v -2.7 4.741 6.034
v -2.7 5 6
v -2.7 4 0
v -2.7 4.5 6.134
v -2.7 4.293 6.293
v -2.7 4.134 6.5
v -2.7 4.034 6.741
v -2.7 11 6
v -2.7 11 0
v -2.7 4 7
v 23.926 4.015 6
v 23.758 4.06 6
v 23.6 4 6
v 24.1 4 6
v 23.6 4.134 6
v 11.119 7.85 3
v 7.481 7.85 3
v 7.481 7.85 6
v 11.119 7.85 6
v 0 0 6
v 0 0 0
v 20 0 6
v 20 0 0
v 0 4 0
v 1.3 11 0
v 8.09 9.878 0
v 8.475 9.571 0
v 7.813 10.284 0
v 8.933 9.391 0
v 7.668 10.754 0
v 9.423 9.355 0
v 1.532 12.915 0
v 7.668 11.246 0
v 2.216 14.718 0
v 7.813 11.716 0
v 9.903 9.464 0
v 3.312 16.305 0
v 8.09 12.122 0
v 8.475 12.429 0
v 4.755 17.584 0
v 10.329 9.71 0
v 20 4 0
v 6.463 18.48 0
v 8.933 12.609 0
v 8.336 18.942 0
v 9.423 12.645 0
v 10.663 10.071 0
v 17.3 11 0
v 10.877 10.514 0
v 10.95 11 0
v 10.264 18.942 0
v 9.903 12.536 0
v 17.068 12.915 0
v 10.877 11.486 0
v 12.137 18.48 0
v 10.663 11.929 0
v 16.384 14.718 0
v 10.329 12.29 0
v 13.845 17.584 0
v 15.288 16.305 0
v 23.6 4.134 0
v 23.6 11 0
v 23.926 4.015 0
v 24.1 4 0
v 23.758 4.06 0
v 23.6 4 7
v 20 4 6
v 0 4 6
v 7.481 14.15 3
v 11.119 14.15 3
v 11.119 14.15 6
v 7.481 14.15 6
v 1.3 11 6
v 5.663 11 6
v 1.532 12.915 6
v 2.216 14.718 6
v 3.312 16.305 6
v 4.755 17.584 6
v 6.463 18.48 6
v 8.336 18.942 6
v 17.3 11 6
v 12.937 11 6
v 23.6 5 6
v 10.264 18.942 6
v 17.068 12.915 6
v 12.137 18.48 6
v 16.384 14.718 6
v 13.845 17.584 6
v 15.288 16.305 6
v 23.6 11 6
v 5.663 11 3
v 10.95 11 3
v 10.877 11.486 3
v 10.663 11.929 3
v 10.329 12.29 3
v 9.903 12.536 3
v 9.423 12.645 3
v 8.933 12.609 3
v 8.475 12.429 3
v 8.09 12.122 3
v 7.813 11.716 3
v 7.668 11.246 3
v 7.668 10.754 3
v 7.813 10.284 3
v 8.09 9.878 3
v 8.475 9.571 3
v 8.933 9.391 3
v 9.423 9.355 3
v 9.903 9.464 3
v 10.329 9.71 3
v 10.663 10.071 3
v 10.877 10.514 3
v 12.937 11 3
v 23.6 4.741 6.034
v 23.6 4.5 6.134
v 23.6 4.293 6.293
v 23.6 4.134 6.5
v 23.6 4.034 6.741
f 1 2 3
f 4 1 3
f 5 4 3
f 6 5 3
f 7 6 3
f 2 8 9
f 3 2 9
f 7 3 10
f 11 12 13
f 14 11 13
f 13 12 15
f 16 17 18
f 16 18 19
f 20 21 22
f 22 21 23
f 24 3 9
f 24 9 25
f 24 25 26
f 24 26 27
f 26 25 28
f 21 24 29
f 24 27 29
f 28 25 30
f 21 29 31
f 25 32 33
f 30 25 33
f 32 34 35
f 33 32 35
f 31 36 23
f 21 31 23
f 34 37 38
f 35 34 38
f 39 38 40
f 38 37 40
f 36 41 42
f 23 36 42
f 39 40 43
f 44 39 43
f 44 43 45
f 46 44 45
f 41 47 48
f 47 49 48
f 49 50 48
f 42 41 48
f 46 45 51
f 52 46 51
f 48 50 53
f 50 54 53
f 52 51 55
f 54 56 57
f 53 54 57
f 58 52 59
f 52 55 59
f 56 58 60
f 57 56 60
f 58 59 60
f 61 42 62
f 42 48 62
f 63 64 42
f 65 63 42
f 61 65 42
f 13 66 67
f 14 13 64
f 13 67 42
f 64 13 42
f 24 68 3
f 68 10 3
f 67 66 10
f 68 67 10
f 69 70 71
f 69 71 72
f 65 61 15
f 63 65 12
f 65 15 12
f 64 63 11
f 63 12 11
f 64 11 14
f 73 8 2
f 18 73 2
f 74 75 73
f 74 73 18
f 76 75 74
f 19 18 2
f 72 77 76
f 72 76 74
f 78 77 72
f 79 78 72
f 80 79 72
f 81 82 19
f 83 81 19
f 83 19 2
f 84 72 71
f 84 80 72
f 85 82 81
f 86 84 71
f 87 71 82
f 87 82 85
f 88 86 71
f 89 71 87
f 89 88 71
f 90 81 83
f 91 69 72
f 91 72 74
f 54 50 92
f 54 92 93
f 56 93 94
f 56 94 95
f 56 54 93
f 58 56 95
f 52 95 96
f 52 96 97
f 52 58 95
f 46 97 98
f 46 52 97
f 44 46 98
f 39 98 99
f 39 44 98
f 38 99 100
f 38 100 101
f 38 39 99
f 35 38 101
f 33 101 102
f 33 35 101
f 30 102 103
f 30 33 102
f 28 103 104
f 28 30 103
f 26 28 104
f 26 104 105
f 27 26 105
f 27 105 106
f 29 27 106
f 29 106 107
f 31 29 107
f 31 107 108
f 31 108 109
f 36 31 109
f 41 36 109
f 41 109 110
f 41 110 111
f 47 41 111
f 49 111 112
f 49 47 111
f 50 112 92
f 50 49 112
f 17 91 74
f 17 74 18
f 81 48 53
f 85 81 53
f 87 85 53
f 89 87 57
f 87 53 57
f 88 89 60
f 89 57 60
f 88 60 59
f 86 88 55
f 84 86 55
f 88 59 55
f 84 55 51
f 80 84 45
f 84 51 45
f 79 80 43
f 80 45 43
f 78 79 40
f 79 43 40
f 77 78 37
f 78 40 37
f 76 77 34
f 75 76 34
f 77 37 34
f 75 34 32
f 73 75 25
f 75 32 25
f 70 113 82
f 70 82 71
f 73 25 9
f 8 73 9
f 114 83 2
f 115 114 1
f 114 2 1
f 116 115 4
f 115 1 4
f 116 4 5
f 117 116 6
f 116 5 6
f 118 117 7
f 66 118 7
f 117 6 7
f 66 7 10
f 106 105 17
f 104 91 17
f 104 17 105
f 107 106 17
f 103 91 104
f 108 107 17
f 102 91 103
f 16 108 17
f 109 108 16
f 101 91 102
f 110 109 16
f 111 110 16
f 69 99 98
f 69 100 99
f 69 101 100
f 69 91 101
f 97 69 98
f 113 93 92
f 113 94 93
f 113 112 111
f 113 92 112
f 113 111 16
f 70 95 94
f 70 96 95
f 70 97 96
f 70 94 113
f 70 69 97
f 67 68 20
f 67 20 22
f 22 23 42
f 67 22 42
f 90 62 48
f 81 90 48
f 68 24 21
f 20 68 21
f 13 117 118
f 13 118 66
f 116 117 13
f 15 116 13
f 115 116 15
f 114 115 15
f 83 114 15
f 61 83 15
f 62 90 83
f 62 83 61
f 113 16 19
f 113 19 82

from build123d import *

# Parameters (mm, degrees)
BOSS_EXTRUDE1_DEPTH = 6
BOSS_EXTRUDE2_DEPTH = 26.3
BOSS_EXTRUDE3_DEPTH = 6
SKETCH8_R           = 1.65
BOSS_EXTRUDE4_DEPTH = 3


with BuildPart() as part:
    # Sketch1 → Boss-Extrude1 (new body)
    with BuildSketch(Plane.XY):
        with BuildLine():
            Line((0, 0), (20, 0))
            Line((20, 0), (20, 4))
            Line((20, 4), (23.6, 4))
            Line((23.6, 4), (23.6, 11))
            Line((23.6, 11), (17.3, 11))
            ThreePointArc((17.3, 11), (9.3, 19), (1.3, 11))
            Line((1.3, 11), (-2.7, 11))
            Line((-2.7, 11), (-2.7, 4))
            Line((-2.7, 4), (0, 4))
            Line((0, 4), (0, 0))
        make_face()
        Polygon((11.118653348, 14.15), (7.481346652, 14.15), (5.662693304, 11), (7.481346652, 7.85), (11.118653348, 7.85), (12.937306696, 11), align=None, mode=Mode.SUBTRACT)
    extrude(amount=BOSS_EXTRUDE1_DEPTH)

    # Sketch2 → Boss-Extrude2 (add)
    with BuildSketch(Plane.ZY.offset(2.7)):
        with BuildLine():
            Line((6, 4), (6, 5))
            ThreePointArc((6, 5), (6.292893219, 4.292893219), (7, 4))
            Line((7, 4), (6, 4))
        make_face()
    extrude(amount=-BOSS_EXTRUDE2_DEPTH)

    # Sketch4 → Boss-Extrude3 (add)
    with BuildSketch(Plane.XY.offset(6)):
        with BuildLine():
            Line((23.1, 4), (23.1, 5))
            ThreePointArc((23.1, 5), (23.392893219, 4.292893219), (24.1, 4))
            Line((24.1, 4), (23.1, 4))
        make_face()
        with BuildLine():
            Line((-1.5, 4), (-2.5, 4))
            ThreePointArc((-2.5, 4), (-1.792893219, 4.292893219), (-1.5, 5))
            Line((-1.5, 5), (-1.5, 4))
        make_face()
    extrude(amount=-BOSS_EXTRUDE3_DEPTH)

    # Sketch8 → Boss-Extrude4 (add)
    with BuildSketch(Plane.XY):
        Polygon((7.481346652, 14.15), (5.662693304, 11), (7.481346652, 7.85), (11.118653348, 7.85), (12.937306696, 11), (11.118653348, 14.15), align=None)
        with Locations((9.3, 11)):
            Circle(SKETCH8_R, mode=Mode.SUBTRACT)
    extrude(amount=BOSS_EXTRUDE4_DEPTH)


solid = part.part
